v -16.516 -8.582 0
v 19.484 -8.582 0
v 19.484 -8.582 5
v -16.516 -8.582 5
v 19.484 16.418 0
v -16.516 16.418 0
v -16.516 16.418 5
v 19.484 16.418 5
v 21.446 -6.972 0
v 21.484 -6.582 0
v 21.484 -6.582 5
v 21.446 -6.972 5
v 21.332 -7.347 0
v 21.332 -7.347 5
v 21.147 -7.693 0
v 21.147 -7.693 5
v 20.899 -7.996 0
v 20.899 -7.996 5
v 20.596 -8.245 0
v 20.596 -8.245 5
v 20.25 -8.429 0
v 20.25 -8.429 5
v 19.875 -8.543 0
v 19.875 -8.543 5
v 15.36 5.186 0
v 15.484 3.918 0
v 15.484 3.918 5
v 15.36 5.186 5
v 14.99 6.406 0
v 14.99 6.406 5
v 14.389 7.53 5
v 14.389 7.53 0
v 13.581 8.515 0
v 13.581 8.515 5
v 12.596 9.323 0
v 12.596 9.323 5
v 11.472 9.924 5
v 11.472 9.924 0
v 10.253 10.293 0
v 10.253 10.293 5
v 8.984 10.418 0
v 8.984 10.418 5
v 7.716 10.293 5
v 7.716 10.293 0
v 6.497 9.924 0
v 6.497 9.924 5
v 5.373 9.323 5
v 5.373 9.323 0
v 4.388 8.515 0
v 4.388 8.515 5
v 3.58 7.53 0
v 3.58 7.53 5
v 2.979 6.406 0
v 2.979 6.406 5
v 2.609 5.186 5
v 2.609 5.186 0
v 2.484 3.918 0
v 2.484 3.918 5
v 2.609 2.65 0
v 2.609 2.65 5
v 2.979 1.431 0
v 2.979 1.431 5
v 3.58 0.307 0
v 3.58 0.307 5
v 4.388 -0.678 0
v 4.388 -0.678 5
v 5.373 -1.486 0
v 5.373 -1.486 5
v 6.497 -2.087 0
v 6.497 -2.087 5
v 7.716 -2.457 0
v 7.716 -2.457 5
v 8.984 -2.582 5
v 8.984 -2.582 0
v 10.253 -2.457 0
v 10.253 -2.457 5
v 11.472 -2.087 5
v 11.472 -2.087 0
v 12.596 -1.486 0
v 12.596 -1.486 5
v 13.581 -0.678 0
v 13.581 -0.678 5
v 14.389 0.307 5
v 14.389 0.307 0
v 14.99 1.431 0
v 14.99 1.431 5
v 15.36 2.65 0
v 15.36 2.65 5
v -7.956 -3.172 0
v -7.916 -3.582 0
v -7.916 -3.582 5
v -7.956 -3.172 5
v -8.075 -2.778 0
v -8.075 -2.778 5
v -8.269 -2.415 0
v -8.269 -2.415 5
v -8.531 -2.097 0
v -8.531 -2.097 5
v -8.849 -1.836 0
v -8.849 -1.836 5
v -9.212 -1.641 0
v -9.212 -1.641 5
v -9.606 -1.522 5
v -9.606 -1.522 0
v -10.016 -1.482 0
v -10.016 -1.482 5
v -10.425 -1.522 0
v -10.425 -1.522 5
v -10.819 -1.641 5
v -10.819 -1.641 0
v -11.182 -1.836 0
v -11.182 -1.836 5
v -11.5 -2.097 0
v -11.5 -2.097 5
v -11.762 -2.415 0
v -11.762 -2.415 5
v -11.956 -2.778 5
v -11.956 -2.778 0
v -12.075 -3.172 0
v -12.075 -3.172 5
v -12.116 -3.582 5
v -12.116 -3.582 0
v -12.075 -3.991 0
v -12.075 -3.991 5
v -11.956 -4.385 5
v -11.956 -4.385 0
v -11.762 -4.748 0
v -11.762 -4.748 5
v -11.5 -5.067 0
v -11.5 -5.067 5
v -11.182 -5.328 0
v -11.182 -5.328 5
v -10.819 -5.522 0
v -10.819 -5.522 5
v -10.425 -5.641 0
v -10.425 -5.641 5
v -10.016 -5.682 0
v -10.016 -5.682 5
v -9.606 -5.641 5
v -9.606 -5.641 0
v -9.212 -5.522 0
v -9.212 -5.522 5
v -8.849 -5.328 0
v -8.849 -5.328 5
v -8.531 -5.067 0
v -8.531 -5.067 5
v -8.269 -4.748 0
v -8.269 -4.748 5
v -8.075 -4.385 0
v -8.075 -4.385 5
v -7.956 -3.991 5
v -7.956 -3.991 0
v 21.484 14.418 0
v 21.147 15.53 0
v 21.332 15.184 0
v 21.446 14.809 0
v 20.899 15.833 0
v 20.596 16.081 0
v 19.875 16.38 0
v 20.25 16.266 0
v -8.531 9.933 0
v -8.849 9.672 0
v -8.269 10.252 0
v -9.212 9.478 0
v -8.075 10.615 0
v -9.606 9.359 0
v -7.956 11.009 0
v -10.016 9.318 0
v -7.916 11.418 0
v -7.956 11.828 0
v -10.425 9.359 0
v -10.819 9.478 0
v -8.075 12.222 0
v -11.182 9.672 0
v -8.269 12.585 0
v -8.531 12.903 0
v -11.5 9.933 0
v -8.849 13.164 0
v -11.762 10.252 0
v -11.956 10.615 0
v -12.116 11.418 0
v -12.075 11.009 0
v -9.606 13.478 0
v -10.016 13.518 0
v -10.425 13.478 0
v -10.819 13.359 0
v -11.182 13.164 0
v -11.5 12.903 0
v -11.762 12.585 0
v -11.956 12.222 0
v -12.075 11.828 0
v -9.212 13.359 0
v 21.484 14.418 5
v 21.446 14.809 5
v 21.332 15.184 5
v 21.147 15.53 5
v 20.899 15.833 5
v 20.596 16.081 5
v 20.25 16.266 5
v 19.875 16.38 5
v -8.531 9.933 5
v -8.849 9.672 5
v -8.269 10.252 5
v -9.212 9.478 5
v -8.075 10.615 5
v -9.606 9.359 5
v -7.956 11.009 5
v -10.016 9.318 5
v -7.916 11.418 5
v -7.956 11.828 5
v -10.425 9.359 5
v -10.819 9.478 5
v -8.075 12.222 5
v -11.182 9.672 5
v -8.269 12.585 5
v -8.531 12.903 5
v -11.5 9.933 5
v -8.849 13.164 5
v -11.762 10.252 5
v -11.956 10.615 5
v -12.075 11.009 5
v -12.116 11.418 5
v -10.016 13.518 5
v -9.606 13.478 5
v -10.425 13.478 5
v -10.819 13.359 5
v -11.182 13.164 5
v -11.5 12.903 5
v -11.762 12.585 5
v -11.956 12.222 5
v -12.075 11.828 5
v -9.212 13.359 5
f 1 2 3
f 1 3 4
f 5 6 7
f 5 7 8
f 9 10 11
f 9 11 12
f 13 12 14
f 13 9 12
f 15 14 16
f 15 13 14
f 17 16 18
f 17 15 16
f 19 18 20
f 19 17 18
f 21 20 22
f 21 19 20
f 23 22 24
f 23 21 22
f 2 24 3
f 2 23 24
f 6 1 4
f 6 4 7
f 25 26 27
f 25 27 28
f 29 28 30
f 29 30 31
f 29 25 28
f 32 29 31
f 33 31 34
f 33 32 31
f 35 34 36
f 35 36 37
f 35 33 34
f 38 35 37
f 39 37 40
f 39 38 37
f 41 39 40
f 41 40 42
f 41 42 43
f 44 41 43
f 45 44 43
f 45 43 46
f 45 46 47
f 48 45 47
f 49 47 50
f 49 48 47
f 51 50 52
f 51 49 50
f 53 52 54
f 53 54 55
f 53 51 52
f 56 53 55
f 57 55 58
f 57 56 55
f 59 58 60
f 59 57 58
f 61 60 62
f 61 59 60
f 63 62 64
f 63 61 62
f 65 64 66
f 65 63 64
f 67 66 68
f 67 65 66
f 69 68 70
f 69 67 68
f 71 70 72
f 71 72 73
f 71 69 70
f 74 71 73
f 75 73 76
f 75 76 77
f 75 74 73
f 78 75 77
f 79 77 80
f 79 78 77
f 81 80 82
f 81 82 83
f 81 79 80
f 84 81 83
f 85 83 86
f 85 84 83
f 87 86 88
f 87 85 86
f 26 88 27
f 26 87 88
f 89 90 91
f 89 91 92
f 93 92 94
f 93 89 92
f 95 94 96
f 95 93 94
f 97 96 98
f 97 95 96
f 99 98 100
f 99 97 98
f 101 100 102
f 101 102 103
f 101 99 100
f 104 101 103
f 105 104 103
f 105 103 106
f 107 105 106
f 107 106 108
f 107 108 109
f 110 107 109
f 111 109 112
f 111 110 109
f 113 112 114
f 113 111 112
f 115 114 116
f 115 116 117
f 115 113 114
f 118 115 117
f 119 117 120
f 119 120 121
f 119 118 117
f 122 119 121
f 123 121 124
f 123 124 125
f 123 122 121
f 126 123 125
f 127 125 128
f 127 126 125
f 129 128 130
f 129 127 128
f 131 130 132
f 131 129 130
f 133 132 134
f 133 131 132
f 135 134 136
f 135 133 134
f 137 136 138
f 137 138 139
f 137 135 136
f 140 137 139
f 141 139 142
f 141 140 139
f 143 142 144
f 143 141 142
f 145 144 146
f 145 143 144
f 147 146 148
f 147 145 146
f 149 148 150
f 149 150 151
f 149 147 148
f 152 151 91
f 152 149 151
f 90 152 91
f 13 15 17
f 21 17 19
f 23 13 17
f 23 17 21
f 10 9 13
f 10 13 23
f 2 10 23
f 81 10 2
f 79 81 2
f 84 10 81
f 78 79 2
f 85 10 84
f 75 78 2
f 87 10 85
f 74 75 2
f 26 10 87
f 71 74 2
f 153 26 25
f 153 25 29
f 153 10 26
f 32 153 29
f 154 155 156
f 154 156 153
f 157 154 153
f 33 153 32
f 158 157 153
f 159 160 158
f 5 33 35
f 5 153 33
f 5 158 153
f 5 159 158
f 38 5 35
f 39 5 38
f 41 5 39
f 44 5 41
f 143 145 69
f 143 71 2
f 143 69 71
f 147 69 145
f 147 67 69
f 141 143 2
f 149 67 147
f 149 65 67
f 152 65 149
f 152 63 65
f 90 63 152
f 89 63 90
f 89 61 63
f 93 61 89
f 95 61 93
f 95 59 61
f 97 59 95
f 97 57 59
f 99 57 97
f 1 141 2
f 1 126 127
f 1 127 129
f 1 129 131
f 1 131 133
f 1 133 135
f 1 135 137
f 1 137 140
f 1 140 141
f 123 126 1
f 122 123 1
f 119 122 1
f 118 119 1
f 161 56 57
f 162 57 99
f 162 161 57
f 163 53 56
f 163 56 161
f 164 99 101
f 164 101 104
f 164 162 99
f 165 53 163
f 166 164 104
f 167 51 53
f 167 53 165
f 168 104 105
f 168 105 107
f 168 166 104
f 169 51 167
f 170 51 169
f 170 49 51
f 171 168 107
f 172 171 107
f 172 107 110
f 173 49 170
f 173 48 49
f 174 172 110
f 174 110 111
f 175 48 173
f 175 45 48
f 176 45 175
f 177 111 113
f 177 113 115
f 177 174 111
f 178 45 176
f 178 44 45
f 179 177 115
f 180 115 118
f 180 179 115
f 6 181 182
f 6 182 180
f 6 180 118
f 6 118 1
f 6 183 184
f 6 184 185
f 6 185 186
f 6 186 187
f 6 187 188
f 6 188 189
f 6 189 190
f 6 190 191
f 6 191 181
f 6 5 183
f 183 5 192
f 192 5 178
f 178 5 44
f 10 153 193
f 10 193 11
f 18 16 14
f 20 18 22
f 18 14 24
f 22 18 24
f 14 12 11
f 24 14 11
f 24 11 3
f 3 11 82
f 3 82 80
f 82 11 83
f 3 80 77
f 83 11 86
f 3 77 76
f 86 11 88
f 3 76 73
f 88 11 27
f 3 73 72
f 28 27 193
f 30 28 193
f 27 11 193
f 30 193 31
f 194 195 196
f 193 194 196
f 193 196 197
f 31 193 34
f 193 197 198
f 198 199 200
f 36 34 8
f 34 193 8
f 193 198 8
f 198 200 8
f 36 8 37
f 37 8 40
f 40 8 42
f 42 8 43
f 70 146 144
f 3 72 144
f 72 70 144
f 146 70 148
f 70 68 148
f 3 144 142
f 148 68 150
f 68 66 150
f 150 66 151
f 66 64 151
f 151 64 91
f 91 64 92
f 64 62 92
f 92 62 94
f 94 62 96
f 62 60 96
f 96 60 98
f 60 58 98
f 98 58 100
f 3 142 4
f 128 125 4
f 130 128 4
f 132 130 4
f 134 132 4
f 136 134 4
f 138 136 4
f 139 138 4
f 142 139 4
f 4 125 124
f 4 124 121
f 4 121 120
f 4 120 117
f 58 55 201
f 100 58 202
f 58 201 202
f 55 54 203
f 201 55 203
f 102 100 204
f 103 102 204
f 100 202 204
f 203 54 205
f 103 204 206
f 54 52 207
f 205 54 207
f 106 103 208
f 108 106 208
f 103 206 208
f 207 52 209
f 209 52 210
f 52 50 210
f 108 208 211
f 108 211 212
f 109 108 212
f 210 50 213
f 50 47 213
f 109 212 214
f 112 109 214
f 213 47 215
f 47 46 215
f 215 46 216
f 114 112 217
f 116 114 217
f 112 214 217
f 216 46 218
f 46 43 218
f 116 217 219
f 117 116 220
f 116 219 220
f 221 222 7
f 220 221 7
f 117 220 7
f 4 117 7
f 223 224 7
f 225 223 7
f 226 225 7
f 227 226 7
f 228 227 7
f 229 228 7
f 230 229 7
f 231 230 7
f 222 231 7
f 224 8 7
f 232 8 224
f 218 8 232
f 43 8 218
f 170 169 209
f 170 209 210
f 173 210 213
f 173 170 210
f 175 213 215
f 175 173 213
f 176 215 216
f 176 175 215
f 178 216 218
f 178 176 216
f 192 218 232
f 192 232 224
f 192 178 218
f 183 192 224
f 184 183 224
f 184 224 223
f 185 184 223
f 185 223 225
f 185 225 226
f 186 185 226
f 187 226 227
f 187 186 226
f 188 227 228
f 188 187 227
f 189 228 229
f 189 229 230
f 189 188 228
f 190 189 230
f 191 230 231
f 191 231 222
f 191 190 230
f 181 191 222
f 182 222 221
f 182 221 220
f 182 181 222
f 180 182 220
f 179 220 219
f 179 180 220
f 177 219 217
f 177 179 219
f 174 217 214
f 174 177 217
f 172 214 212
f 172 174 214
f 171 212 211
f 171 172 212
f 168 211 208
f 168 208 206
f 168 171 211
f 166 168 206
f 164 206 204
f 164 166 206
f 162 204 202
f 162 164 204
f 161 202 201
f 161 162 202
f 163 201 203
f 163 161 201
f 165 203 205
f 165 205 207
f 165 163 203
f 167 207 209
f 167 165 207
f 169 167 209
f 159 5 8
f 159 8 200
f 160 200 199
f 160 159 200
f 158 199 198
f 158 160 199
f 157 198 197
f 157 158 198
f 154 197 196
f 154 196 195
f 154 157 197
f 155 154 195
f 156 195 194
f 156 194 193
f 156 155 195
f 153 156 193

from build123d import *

# Parameters (mm, degrees)
SKETCH_1_R      = 2.1
SKETCH_1_R_2    = 6.5
EXTRUDE_1_DEPTH = 5


with BuildPart() as part:
    # 草图1 → 凸台-拉伸1 (new body)
    with BuildSketch(Plane.XY):
        with BuildLine():
            Line((-16.515544041, 16.418393782), (19.484455959, 16.418393782))
            ThreePointArc((19.484455959, 16.418393782), (20.898669521, 15.832607345), (21.484455959, 14.418393782))
            Line((21.484455959, 14.418393782), (21.484455959, -6.581606218))
            ThreePointArc((21.484455959, -6.581606218), (20.898669521, -7.99581978), (19.484455959, -8.581606218))
            Line((19.484455959, -8.581606218), (-16.515544041, -8.581606218))
            Line((-16.515544041, -8.581606218), (-16.515544041, 16.418393782))
        make_face()
        with Locations((-10.015544041, -3.581606218)):
            Circle(SKETCH_1_R, mode=Mode.SUBTRACT)
        with Locations((-10.015544041, 11.418393782)):
            Circle(SKETCH_1_R, mode=Mode.SUBTRACT)
        with Locations((8.984455959, 3.918393782)):
            Circle(SKETCH_1_R_2, mode=Mode.SUBTRACT)
    extrude(amount=EXTRUDE_1_DEPTH)


solid = part.part
